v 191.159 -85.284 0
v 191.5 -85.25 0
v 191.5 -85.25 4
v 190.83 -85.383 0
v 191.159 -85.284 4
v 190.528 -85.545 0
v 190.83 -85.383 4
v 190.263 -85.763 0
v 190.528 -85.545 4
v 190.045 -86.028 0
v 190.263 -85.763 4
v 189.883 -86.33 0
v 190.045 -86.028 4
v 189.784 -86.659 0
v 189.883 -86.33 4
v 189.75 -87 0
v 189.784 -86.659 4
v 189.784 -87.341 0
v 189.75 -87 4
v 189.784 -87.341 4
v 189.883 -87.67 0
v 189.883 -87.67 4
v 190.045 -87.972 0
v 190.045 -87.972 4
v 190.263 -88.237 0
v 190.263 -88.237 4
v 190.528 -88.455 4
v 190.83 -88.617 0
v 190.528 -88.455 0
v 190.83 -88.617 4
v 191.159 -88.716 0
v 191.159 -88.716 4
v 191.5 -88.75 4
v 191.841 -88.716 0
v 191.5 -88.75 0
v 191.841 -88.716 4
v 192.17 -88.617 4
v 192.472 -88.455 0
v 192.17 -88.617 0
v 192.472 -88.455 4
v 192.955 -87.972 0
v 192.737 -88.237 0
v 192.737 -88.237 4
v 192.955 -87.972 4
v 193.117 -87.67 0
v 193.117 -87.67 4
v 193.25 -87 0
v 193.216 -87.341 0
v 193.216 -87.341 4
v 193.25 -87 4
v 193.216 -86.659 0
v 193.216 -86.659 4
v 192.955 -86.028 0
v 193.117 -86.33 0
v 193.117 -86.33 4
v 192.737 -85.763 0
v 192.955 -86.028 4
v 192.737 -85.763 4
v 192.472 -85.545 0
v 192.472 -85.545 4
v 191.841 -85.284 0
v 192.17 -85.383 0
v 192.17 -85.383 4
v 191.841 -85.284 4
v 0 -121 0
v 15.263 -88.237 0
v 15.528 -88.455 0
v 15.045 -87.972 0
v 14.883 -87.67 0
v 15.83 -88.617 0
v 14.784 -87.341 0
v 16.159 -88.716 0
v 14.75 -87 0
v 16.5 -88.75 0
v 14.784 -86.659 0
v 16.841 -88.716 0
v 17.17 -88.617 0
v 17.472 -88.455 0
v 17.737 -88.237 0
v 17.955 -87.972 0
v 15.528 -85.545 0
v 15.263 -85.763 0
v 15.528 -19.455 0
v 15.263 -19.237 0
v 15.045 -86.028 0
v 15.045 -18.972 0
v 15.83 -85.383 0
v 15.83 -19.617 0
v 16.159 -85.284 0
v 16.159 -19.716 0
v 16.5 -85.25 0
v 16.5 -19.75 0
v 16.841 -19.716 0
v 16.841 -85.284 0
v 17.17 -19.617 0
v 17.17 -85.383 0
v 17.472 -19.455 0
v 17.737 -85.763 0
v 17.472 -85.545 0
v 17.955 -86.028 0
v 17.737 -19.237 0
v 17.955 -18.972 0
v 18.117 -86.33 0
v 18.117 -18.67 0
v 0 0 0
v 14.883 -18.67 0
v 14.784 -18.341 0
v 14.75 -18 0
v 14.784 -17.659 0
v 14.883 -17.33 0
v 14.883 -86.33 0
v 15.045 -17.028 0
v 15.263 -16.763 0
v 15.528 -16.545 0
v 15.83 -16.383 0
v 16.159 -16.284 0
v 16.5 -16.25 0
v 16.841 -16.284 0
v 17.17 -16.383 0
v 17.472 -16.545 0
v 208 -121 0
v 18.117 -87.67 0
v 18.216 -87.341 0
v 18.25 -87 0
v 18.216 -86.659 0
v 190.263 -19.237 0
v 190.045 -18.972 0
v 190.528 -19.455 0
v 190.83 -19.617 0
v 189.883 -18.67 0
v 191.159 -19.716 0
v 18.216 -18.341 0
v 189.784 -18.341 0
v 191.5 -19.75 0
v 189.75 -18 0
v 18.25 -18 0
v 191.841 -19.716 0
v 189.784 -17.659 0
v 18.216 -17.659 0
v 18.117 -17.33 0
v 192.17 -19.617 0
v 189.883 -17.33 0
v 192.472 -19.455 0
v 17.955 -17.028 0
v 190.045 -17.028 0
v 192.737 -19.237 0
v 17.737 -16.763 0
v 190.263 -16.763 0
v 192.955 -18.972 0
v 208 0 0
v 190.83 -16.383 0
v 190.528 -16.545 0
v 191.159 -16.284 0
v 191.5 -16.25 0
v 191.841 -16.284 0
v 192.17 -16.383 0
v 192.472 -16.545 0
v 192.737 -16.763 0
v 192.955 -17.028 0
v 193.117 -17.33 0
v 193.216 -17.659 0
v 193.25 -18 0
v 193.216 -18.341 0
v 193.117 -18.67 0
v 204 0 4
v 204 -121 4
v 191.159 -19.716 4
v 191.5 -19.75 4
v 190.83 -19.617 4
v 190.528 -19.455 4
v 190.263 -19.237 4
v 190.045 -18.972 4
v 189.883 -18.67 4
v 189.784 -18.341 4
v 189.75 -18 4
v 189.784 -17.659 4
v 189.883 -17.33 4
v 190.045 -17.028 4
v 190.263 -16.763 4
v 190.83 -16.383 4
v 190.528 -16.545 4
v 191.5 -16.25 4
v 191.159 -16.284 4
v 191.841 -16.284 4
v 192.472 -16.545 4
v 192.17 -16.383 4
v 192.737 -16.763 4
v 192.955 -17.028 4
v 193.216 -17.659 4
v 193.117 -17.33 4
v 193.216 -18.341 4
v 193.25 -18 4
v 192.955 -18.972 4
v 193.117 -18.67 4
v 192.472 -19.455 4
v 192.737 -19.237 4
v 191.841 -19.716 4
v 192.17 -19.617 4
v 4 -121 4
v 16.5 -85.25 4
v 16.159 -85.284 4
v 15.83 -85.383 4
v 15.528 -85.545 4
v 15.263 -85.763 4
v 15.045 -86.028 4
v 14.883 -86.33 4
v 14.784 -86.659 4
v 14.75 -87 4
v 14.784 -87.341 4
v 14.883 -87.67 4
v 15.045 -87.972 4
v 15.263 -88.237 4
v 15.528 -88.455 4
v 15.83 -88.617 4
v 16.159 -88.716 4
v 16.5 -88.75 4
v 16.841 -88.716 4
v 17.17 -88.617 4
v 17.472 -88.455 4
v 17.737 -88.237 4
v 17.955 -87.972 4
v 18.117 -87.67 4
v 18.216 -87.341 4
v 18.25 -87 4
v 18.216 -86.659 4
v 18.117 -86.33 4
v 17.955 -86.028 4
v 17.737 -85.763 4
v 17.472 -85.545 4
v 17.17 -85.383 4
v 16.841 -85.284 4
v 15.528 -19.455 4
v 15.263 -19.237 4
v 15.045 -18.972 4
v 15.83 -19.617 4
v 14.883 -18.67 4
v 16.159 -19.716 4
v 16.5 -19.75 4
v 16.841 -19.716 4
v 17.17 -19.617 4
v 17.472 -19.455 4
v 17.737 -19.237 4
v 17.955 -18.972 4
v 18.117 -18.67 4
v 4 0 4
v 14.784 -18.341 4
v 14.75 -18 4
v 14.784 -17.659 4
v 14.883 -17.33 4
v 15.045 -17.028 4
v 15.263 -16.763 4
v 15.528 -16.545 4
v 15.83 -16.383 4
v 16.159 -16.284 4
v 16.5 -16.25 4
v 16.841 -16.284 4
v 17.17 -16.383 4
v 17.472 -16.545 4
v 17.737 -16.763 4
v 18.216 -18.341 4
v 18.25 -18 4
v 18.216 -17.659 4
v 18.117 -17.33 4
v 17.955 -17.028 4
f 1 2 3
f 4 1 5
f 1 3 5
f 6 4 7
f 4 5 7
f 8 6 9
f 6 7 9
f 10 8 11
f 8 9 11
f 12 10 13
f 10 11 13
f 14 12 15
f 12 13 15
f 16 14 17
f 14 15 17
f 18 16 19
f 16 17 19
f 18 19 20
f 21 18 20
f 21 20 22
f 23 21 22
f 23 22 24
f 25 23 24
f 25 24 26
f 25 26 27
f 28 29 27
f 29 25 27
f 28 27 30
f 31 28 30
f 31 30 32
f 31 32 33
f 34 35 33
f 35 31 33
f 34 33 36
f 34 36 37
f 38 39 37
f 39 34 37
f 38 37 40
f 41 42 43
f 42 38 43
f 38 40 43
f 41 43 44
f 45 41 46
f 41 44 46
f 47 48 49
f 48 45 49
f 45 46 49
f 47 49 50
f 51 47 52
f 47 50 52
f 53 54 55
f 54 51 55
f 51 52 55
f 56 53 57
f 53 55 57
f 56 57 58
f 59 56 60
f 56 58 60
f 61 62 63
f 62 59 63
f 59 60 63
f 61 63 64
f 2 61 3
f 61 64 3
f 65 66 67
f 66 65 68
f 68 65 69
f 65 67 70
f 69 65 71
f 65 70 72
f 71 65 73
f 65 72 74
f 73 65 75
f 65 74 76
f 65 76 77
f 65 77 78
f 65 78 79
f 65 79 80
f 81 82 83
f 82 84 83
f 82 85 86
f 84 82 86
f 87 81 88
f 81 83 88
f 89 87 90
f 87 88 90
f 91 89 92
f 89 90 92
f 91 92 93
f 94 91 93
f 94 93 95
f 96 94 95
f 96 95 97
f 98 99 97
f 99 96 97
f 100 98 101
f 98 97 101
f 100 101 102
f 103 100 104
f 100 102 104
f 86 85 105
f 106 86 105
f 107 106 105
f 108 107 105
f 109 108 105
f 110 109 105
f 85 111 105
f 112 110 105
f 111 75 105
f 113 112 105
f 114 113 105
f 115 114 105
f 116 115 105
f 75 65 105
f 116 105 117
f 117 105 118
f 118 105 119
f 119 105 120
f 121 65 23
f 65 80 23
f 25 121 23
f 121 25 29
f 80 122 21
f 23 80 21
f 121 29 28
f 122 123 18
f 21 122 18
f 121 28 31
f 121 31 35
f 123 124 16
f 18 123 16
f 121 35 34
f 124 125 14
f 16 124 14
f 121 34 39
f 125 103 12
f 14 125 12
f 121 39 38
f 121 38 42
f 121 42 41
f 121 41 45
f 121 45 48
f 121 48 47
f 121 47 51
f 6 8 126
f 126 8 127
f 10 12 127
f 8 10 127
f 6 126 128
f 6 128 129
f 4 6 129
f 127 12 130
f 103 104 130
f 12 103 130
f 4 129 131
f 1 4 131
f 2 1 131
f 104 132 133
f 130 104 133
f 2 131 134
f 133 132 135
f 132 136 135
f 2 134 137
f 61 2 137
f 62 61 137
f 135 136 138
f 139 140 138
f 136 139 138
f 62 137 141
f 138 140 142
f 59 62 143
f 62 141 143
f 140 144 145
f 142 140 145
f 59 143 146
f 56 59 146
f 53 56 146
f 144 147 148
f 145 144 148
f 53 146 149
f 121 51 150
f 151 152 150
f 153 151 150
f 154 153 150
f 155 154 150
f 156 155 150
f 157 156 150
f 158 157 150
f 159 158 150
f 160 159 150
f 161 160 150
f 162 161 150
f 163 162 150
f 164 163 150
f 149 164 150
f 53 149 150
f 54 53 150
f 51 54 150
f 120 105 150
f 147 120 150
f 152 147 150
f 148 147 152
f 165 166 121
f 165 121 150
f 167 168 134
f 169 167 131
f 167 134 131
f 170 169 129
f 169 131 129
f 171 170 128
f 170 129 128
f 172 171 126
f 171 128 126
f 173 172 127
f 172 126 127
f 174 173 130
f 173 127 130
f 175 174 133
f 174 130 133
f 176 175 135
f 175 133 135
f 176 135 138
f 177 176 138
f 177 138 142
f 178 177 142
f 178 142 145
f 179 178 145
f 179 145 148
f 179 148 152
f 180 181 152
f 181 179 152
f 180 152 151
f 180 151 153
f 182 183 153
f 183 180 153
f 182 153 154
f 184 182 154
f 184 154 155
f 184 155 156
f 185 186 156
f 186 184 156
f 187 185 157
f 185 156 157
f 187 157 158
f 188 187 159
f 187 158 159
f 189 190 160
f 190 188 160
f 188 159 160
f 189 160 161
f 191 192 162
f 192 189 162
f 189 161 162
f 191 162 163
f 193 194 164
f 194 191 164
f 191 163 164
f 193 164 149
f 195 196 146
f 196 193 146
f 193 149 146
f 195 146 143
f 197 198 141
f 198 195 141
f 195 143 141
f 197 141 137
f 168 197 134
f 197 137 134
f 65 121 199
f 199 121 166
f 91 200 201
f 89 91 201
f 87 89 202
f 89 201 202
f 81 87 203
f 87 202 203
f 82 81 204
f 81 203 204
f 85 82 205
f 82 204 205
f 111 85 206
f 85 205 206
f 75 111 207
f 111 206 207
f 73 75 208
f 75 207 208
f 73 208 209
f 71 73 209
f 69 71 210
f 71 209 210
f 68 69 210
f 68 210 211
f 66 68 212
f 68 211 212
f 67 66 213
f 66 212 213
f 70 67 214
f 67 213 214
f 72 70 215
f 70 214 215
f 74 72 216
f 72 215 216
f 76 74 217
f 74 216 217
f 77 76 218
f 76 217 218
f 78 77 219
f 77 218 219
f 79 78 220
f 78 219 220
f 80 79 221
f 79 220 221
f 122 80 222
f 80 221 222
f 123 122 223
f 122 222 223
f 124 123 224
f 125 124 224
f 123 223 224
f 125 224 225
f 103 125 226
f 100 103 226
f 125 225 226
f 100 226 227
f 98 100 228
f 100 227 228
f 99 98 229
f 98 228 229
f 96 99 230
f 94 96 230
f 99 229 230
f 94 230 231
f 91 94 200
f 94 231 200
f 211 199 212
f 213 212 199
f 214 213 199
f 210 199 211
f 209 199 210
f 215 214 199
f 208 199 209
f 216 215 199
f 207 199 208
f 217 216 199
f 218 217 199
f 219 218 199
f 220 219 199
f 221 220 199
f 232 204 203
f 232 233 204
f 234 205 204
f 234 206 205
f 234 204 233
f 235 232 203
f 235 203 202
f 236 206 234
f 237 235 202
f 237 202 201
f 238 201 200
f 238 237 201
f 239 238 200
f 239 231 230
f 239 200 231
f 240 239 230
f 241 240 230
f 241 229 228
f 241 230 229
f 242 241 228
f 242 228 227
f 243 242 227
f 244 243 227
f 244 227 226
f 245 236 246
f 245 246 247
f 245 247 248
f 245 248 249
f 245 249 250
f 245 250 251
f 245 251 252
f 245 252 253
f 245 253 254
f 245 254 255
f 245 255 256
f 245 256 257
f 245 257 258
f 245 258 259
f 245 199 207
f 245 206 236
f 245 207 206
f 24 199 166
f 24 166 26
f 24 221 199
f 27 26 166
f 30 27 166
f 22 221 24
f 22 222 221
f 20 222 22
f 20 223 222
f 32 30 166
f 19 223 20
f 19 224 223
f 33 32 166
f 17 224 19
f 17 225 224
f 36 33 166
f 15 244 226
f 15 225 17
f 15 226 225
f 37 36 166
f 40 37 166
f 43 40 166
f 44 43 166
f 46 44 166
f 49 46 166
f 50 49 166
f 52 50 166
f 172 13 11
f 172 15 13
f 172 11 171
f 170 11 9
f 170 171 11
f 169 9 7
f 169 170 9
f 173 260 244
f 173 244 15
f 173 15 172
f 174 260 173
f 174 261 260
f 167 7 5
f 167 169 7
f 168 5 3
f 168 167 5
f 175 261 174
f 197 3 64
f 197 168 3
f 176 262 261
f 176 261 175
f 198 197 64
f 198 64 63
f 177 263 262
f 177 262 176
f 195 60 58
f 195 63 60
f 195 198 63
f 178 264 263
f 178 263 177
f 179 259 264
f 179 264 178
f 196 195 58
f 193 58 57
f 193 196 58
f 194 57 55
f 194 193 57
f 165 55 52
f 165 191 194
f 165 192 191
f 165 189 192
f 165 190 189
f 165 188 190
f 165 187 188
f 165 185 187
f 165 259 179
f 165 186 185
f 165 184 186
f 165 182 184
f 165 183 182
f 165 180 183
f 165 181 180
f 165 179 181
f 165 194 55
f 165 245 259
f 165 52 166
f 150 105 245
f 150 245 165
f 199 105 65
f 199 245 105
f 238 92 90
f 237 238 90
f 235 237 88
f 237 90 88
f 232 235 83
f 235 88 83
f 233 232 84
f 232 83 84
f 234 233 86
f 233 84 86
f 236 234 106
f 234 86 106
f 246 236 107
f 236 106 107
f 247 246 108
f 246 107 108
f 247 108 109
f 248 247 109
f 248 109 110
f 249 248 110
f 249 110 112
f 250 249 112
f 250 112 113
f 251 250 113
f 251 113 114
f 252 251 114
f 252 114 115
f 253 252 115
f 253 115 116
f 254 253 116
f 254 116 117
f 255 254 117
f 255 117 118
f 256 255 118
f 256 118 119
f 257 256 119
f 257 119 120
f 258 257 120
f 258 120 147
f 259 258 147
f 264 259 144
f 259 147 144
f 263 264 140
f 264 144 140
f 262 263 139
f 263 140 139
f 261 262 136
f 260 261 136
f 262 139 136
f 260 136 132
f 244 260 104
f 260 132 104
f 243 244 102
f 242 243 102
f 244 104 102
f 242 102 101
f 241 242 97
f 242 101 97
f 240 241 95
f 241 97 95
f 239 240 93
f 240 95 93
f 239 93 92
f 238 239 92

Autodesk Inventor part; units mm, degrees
ref_plane "YZ Plane" through (0, 0, 0) normal (1, 0, 0) x (0, 1, 0)
ref_plane "XZ Plane" through (0, 0, 0) normal (0, 1, 0) x (-1, 0, 0)
ref_plane "XY Plane" through (0, 0, 0) normal (0, 0, 1) x (1, 0, 0)
sketch "Sketch1" plane through (0, 0, 0) normal (0, 0, 1) x (1, 0, 0)
  line L0 (0, 0) -> (208, 0)
  line L1 (208, 0) -> (208, -121)
  line L2 (208, -121) -> (0, -121)
  line L3 (0, -121) -> (0, 0)
  dimension "d0" = 208
  dimension "d1" = 121
extrude "Extrusion1" add sketch "Sketch1" along normal blind 4
sketch "Sketch2" plane through (0, 0, 0) normal (0, 0, -1) x (-1, 0, 0)
  line L0 (0, -121) -> (-208, -121) projected
  line L1 (0, -121) -> (-16.5, -121)
  line L2 (-16.5, -121) -> (-16.5, -87)
  line L3 (-16.5, -87) -> (0, -87)
  line L4 (0, -87) -> (0, -121)
  point P0 (0, 0)
  dimension "d4" = 16.5
  dimension "d5" = 34
hole "Hole1" at (16.5, -87, 0) direction (0, 0, 1) diameter 3.5 depth 8.8
ref_plane "Work Plane1" through (104, -121, 0) normal (-1, 0, 0) x (0, 0, 1)
ref_plane "Work Plane2" through (0, -60.5, 0) normal (0, 1, 0) x (1, 0, 0)
sketch "Sketch3" plane through (0, 0, 4) normal (0, 0, 1) x (1, 0, 0)
  line L0 (208, 0) -> (0, 0) projected
  line L1 (0, 0) -> (16.5, 0)
  line L2 (16.5, 0) -> (16.5, -18)
  line L3 (16.5, -18) -> (0, -18)
  line L4 (0, -18) -> (0, 0)
  dimension "d13" = 16.5
  dimension "d14" = 18
hole "Hole2" at (16.5, -18, 4) direction (0, 0, -1) diameter 3.5 depth 8.8
mirror "Mirror1" about plane through (104, -121, 0) normal (-1, 0, 0) of "Hole2", "Hole1"
chamfer "Chamfer1" distance 4 angle 45 2 edges at (0, -60.5, 4) (208, -60.5, 4)
properties part number "wall-front"
